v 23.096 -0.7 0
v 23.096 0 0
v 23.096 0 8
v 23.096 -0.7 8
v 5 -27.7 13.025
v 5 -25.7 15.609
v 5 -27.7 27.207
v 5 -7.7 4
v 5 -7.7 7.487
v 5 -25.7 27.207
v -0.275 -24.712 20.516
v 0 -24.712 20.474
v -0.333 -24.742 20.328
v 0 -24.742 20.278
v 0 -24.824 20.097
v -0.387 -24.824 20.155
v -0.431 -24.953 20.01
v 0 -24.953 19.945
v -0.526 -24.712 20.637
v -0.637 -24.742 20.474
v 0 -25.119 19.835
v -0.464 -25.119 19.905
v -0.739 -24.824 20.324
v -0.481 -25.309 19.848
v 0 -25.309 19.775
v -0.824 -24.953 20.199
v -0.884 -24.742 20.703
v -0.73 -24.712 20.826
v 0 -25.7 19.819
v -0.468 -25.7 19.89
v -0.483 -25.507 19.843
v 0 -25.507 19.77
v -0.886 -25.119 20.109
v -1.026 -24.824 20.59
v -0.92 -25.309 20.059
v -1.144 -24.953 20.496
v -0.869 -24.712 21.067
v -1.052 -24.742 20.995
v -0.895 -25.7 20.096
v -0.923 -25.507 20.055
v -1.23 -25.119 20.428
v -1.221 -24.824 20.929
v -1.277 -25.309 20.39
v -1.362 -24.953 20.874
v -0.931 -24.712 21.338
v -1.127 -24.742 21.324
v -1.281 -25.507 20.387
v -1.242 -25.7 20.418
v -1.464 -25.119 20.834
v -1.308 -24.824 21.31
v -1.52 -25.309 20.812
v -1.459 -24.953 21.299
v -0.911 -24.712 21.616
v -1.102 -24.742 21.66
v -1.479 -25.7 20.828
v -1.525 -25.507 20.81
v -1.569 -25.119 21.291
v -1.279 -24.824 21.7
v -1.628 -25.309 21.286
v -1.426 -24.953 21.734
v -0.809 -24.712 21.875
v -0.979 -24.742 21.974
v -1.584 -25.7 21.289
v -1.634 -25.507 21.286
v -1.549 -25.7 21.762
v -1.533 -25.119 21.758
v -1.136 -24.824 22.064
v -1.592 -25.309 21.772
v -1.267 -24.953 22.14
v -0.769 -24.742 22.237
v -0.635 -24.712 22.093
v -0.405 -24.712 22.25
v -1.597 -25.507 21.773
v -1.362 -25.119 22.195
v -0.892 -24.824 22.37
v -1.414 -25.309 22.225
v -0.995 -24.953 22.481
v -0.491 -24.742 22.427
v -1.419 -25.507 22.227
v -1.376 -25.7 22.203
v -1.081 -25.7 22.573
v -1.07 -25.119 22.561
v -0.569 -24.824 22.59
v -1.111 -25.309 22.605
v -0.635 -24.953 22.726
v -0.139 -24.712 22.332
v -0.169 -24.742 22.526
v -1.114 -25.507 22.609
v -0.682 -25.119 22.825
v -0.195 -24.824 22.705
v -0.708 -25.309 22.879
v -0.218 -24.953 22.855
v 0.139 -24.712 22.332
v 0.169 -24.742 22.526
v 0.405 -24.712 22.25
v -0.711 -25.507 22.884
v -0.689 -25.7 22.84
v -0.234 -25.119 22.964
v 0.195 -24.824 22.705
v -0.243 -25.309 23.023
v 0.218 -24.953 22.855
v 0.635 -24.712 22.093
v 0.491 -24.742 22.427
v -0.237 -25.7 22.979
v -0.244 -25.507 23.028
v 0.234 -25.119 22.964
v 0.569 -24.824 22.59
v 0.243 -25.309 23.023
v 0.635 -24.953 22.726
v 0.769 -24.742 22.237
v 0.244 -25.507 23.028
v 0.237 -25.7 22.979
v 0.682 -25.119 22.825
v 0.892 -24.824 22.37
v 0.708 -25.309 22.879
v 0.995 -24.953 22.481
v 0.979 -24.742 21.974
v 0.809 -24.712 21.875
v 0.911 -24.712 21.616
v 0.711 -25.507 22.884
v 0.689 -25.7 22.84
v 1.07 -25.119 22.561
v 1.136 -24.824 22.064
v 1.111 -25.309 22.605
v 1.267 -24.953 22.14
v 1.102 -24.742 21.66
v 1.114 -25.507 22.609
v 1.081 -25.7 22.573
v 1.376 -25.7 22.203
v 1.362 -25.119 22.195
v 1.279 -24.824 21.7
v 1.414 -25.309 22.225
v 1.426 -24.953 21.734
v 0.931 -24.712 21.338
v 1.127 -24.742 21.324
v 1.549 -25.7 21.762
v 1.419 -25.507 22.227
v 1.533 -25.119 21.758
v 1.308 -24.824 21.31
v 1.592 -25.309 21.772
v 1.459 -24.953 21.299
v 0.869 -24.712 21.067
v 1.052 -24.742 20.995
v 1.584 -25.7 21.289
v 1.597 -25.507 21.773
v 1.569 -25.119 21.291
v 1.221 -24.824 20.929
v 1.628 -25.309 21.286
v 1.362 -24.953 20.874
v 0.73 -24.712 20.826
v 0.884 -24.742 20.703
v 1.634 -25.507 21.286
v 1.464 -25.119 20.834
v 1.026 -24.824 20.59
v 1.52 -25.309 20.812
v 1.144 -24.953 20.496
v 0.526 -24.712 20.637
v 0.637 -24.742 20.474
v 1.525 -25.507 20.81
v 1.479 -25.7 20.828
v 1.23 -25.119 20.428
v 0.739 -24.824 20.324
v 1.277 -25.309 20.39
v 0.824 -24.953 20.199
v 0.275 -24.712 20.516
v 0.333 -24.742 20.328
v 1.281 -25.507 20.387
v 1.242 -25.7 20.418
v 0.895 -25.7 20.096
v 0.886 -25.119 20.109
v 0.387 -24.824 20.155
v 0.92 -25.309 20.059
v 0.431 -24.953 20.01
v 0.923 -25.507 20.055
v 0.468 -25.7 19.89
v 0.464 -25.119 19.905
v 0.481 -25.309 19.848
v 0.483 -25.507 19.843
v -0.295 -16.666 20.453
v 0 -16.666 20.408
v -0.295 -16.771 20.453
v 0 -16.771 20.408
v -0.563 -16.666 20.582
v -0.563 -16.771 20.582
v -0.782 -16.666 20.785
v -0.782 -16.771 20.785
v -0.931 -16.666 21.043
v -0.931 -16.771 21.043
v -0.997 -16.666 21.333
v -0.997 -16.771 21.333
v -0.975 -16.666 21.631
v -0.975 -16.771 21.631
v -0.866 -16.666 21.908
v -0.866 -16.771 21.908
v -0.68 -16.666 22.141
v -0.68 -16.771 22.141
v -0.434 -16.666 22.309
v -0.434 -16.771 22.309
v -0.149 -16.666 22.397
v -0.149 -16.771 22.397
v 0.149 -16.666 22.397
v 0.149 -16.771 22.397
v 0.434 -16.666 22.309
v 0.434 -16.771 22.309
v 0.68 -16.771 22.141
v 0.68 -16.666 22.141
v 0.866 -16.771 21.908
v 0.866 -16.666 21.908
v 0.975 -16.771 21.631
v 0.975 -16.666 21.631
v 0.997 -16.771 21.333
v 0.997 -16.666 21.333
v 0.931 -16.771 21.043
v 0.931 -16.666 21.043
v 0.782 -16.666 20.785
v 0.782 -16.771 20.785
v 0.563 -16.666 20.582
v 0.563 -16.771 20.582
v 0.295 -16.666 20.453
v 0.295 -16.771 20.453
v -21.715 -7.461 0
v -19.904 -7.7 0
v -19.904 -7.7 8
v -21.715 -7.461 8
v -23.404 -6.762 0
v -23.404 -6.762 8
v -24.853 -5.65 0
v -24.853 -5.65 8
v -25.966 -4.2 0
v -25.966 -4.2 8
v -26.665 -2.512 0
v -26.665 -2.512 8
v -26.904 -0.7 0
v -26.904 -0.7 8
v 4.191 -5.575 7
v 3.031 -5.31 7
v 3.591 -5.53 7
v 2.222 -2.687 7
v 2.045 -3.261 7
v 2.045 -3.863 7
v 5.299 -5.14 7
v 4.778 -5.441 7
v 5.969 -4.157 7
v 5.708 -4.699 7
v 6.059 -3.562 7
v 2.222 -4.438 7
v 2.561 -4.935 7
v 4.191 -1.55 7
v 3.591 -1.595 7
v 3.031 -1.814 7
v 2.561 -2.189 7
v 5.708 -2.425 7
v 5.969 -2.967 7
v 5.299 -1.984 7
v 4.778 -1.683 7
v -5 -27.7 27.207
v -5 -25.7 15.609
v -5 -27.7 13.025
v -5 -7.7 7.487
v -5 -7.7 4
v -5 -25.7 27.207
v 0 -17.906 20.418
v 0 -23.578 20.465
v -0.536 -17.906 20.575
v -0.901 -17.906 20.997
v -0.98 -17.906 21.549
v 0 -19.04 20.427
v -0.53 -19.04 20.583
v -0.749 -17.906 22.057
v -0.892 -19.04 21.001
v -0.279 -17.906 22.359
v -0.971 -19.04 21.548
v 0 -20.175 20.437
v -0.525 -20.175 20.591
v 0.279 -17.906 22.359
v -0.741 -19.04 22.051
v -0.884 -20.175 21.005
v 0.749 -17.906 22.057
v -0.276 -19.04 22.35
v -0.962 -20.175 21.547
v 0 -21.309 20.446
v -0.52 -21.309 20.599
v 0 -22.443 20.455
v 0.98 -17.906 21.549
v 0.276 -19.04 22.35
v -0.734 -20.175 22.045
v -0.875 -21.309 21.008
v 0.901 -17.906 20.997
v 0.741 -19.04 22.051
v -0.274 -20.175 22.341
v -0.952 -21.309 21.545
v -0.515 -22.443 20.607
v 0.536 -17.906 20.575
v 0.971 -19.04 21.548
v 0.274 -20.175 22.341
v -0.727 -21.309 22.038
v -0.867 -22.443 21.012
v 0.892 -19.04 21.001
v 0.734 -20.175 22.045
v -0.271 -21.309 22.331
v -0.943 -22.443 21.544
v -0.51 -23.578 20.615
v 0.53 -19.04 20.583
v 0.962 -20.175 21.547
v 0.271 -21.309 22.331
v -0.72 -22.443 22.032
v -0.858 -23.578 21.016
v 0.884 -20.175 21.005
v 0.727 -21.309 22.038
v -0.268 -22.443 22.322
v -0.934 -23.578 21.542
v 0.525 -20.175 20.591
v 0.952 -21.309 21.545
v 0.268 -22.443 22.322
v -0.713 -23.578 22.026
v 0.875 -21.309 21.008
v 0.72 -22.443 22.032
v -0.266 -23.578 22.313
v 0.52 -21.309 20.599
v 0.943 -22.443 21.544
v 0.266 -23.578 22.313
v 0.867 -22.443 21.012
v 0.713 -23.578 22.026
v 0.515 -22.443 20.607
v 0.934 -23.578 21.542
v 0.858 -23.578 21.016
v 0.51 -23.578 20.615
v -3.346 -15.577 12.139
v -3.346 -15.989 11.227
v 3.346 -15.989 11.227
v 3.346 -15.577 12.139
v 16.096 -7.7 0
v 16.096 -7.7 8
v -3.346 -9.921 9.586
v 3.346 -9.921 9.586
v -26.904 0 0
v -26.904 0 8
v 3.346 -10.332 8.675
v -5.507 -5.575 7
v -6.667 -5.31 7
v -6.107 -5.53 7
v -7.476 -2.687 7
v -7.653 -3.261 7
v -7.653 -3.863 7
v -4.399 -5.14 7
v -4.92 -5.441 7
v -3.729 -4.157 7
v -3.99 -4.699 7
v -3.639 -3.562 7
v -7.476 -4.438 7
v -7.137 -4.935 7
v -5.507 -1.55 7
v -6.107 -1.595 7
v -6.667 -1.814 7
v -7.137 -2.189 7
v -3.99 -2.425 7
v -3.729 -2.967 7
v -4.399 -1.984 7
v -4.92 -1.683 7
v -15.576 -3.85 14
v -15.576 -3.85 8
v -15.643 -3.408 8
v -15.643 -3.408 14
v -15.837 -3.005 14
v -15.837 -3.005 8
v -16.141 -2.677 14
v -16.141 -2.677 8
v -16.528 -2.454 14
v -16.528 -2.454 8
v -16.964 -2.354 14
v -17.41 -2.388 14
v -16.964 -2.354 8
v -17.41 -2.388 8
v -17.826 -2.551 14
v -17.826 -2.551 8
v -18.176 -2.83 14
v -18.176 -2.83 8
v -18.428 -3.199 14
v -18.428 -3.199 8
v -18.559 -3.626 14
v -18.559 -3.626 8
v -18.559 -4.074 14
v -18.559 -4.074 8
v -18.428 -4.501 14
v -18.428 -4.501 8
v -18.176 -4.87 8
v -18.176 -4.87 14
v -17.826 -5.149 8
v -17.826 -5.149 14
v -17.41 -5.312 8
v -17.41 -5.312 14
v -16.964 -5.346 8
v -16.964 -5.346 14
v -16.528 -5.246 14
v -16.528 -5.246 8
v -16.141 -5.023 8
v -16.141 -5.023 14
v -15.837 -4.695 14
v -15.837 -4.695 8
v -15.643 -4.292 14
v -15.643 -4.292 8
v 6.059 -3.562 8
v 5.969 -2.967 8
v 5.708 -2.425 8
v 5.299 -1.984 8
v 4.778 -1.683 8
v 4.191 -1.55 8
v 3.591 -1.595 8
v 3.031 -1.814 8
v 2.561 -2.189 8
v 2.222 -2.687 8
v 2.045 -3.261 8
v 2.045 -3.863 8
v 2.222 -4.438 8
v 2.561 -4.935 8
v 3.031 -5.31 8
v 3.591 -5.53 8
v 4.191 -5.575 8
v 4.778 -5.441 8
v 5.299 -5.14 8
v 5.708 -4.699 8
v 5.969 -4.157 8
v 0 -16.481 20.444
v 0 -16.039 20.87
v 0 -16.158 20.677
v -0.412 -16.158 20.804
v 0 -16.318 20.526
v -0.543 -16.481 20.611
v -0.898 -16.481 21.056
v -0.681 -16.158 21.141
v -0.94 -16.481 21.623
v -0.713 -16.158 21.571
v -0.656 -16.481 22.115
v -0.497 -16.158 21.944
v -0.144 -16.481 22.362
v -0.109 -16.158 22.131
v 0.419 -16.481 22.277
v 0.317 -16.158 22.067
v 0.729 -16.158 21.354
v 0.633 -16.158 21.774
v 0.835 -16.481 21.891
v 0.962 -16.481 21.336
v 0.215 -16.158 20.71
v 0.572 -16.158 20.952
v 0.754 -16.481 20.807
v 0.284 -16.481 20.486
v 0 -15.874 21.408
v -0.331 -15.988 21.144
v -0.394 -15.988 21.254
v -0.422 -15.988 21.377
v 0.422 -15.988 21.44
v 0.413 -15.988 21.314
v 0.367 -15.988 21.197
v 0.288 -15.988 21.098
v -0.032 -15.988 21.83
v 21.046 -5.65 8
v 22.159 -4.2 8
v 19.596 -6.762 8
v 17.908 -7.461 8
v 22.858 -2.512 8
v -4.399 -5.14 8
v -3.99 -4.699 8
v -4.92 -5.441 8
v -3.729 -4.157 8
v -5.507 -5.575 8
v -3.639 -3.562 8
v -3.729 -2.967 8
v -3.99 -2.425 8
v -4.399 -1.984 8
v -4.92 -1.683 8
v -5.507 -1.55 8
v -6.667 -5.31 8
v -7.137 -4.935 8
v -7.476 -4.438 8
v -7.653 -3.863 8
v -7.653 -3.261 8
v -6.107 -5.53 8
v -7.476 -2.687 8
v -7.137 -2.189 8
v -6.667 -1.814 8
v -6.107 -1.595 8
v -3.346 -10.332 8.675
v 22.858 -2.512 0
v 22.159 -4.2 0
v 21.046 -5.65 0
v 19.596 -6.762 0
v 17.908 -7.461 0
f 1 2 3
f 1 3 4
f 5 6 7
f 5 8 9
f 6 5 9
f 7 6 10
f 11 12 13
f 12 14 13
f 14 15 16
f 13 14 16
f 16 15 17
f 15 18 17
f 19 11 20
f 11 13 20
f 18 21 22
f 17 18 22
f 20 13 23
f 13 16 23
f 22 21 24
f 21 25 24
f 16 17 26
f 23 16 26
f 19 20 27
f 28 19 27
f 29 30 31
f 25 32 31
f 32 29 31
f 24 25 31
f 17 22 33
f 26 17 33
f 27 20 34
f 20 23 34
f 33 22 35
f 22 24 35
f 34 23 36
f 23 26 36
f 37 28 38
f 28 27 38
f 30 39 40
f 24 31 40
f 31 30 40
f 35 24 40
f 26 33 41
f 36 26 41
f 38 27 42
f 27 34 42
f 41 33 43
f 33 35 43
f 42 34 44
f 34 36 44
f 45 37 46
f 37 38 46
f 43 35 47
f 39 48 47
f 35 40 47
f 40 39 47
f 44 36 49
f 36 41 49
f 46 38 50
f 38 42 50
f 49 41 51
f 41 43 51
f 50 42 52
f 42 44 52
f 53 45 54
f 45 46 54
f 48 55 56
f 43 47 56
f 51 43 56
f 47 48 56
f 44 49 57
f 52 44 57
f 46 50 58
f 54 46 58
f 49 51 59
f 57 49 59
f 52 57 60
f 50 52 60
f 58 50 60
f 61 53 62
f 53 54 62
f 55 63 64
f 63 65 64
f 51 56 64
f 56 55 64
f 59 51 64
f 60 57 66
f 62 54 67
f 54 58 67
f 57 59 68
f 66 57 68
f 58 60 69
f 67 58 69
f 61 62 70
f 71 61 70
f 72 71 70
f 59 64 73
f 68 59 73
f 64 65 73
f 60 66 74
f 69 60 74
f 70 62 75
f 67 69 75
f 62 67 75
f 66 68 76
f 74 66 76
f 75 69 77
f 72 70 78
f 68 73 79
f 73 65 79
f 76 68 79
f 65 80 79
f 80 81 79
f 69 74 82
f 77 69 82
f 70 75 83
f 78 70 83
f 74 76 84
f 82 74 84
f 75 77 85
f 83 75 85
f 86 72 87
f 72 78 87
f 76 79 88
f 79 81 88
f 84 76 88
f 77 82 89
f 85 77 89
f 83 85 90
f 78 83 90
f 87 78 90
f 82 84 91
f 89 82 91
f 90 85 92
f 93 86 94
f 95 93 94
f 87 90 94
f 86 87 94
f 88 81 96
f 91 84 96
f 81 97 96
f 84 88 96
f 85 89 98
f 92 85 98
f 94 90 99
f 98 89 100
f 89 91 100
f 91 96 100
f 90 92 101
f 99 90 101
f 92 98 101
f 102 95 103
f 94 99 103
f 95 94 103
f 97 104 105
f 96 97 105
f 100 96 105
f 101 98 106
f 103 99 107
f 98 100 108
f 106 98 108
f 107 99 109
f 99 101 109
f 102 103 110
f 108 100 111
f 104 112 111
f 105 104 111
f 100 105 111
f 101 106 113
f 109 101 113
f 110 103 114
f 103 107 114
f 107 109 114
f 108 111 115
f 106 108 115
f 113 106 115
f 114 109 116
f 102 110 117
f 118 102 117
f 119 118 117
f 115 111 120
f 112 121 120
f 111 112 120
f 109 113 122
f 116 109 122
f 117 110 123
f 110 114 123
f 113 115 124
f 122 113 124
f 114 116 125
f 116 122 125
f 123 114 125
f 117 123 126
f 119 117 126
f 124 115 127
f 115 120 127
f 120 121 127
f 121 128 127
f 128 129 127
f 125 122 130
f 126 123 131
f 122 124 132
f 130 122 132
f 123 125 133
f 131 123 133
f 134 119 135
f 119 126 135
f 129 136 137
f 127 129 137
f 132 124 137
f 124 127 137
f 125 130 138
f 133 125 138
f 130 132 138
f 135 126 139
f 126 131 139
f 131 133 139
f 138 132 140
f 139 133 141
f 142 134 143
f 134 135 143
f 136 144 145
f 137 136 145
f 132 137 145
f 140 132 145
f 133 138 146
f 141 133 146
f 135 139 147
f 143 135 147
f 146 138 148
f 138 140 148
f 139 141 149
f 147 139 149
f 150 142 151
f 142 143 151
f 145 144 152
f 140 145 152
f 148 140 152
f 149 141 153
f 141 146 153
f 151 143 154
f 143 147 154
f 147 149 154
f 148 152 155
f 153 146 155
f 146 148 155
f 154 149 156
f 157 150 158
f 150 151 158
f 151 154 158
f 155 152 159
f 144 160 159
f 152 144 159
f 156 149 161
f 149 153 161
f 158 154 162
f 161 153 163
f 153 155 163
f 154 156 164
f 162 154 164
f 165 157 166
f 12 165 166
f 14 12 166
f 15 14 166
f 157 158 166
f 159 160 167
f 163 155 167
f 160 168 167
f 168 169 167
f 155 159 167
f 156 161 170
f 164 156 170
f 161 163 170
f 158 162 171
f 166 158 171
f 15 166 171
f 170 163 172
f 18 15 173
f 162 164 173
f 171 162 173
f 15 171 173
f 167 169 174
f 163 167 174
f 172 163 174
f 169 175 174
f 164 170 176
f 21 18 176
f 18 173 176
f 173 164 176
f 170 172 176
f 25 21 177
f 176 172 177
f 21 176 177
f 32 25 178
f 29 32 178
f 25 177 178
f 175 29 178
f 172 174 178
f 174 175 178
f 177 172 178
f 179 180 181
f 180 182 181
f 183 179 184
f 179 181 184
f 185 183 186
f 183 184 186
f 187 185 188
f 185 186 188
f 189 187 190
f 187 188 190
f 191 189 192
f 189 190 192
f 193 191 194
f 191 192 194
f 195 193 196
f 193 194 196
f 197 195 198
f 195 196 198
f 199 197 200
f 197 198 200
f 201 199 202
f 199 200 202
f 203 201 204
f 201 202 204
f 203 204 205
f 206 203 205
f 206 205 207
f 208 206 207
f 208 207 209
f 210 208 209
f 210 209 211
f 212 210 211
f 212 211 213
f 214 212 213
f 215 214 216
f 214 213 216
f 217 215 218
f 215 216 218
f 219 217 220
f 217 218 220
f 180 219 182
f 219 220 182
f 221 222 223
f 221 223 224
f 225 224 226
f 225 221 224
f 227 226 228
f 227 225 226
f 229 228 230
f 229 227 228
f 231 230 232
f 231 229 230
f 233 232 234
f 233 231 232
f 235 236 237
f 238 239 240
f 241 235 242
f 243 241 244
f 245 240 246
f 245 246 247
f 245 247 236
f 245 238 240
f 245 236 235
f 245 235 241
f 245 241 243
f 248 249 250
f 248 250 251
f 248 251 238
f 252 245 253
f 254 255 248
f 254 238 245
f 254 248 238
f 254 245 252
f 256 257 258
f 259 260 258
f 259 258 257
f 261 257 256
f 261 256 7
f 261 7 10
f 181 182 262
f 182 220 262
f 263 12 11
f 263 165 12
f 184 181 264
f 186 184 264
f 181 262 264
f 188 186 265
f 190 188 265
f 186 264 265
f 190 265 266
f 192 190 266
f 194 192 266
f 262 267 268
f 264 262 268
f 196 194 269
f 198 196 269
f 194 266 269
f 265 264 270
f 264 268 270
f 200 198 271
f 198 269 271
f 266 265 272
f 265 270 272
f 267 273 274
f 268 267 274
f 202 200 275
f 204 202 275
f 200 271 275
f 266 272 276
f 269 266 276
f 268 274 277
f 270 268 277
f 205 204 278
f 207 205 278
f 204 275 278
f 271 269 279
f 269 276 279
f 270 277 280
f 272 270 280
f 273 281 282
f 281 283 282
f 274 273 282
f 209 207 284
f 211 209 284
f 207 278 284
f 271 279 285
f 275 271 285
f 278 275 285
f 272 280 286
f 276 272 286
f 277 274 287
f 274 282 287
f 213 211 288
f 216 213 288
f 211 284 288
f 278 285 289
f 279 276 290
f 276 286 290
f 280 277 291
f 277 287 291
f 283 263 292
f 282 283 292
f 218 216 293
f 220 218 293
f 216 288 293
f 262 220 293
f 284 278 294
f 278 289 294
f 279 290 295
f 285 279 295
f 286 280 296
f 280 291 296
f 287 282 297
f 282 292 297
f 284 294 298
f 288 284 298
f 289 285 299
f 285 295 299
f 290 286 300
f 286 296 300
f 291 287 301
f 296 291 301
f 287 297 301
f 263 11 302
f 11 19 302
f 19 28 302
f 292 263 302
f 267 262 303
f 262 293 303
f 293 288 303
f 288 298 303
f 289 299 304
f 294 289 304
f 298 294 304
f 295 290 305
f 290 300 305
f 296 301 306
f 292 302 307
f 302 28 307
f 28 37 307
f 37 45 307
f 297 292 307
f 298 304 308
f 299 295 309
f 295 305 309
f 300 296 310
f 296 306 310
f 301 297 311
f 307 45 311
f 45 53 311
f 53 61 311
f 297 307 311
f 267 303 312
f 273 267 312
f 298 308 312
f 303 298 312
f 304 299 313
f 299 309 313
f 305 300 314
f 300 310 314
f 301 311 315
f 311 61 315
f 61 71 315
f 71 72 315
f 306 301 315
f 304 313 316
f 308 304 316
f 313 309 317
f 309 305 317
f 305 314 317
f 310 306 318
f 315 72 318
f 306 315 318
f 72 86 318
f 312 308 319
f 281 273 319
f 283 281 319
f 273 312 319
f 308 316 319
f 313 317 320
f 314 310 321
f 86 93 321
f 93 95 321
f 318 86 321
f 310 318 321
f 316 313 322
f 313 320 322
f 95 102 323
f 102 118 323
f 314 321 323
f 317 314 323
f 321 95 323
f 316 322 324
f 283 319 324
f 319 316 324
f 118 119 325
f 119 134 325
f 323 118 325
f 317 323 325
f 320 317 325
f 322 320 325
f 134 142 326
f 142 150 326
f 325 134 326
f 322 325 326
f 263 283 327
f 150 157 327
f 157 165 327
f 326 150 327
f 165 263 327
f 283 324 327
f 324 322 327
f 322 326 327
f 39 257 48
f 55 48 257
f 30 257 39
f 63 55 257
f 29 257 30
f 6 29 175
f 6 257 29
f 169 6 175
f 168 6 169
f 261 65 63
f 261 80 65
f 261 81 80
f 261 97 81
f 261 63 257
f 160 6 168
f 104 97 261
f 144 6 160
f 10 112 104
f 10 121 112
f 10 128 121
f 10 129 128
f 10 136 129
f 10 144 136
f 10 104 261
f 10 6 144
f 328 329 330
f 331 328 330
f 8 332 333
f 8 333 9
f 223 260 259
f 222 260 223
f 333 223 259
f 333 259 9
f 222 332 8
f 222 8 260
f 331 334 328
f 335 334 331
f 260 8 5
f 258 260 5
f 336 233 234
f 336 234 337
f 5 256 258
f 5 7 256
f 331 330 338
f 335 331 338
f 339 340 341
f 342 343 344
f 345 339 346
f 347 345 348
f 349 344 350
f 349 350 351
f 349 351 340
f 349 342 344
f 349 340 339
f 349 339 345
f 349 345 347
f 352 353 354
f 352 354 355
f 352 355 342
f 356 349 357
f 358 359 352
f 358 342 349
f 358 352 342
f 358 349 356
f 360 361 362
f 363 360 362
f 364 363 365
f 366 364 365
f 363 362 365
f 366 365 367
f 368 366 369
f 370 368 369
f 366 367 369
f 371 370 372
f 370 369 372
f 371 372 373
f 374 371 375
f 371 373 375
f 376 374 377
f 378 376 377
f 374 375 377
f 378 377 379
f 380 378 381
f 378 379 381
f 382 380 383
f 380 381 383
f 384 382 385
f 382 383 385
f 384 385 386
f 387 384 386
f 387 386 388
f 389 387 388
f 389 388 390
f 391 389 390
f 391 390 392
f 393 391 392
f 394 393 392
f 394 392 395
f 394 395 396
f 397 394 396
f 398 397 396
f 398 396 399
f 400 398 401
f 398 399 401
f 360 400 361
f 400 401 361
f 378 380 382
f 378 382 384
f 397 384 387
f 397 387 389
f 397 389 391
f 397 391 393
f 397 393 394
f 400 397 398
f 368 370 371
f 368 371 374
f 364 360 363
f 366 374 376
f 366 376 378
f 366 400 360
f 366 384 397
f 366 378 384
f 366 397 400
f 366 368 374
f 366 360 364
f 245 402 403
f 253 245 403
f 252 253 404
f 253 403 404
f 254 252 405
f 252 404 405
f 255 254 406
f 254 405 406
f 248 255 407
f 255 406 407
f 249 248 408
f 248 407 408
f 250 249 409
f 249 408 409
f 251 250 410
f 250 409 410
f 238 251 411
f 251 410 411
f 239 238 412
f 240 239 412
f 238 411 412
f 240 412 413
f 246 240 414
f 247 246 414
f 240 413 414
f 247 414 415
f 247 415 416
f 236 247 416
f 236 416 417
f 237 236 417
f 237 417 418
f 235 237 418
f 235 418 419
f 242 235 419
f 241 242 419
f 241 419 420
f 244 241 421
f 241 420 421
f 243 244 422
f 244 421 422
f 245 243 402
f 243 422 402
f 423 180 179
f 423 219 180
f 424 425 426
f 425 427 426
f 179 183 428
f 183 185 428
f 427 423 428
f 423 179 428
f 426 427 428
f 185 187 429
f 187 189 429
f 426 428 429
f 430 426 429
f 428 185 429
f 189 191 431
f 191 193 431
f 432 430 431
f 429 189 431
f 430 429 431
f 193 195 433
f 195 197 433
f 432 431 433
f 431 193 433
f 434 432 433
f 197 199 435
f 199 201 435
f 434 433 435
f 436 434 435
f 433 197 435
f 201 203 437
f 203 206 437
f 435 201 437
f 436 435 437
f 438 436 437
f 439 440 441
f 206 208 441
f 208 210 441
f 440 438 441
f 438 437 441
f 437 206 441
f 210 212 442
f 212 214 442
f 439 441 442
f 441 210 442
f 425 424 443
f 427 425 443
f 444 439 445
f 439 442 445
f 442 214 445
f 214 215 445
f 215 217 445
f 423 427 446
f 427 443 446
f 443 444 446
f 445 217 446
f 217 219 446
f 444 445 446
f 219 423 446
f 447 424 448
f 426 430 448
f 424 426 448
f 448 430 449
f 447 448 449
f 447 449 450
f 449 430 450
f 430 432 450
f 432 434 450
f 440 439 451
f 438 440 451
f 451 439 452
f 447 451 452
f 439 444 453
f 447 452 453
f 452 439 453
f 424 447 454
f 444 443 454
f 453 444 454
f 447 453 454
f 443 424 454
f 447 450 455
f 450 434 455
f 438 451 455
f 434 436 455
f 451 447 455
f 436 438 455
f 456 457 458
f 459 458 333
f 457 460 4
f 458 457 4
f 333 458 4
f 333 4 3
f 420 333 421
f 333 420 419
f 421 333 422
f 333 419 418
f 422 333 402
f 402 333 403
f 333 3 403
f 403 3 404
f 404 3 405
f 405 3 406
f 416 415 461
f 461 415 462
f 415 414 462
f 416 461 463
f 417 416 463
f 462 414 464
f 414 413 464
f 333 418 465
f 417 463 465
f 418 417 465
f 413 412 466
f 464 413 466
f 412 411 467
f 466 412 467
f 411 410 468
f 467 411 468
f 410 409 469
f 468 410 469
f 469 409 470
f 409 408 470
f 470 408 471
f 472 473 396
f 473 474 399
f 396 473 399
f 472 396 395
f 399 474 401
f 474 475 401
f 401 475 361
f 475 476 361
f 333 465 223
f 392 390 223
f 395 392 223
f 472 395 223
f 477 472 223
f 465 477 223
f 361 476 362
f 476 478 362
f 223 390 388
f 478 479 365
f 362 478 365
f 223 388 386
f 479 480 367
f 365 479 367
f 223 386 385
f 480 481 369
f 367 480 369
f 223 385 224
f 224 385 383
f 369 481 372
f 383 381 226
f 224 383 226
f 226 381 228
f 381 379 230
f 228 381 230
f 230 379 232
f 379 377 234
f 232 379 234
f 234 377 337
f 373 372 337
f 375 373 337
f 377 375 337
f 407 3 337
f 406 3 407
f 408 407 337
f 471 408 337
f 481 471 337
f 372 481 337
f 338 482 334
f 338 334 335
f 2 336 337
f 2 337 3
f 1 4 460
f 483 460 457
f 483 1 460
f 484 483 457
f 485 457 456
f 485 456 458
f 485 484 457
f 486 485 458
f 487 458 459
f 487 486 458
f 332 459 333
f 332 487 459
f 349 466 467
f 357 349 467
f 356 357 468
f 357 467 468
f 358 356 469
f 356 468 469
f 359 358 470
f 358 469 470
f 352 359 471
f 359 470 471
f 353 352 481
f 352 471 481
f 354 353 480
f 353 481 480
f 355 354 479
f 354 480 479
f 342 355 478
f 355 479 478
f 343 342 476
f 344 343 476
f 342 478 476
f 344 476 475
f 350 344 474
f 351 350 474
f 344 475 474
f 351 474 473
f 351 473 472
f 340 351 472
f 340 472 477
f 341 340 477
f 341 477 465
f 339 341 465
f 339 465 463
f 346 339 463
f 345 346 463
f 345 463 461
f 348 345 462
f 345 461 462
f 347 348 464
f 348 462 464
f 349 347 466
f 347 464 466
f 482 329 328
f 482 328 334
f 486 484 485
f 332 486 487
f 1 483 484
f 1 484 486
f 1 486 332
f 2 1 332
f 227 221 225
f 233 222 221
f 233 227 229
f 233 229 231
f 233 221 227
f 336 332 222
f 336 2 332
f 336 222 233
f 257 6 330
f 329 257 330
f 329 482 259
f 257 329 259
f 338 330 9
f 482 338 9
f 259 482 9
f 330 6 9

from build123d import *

# Parameters (mm, degrees)
BOSS_EXTRUDE1_DEPTH = 8
SKETCH2_R           = 1.5
BOSS_EXTRUDE2_DEPTH = 6
BOSS_EXTRUDE3_DEPTH = 5
SKETCH6_W           = 6.69152868
SKETCH6_H           = 6.205945627
BOSS_EXTRUDE6_DEPTH = 1
SKETCH7_R           = 2.018356376
CUT_EXTRUDE1_DEPTH  = 1


with BuildPart() as part:
    # Sketch1 → Boss-Extrude1 (new body)
    with BuildSketch(Plane.XY):
        with BuildLine():
            Line((-26.903550099, 0), (23.096449901, 0))
            Line((23.096449901, 0), (23.096449901, -0.7))
            ThreePointArc((23.096449901, -0.7), (21.046197369, -5.649747468), (16.096449901, -7.7))
            Line((16.096449901, -7.7), (-19.903550099, -7.7))
            ThreePointArc((-19.903550099, -7.7), (-24.853297568, -5.649747468), (-26.903550099, -0.7))
            Line((-26.903550099, -0.7), (-26.903550099, 0))
        make_face()
    extrude(amount=BOSS_EXTRUDE1_DEPTH)

    # Sketch2 → Boss-Extrude2 (add)
    with BuildSketch(Plane.XY.offset(8)):
        with Locations((-17.076235964, -3.85)):
            Circle(SKETCH2_R)
    extrude(amount=BOSS_EXTRUDE2_DEPTH)

    # Sketch3 → Boss-Extrude3 (add, symmetric)
    with BuildSketch(Plane(origin=(0, 0, 0), x_dir=(0, 0, -1), z_dir=(1, 0, 0))):
        Polygon((-4, -7.7), (-13.024577684, -27.7), (-25.024577684, -27.7), (-27.207163102, -27.7), (-27.207163102, -25.7), (-25.024577684, -25.7), (-15.609285193, -25.7), (-7.487165278, -7.7), align=None)
    extrude(amount=BOSS_EXTRUDE3_DEPTH, both=True)

    # Sketch6 → Boss-Extrude6 (add)
    with BuildSketch(Plane(origin=(0, 1.504350405, 3.333896515), x_dir=(1, 0, 0), z_dir=(0, 0.411295964451016, 0.911501853879798))):
        with Locations((0, -16.088463414)):
            Rectangle(SKETCH6_W, SKETCH6_H)
    extrude(amount=BOSS_EXTRUDE6_DEPTH)

    # Sketch7 → Cut-Extrude1 (cut)
    with BuildSketch(Plane.XY.offset(8)):
        with Locations((-5.657616705, -3.562287369)):
            Circle(SKETCH7_R)
        with Locations((4.040388693, -3.562287369)):
            Circle(SKETCH7_R)
    extrude(amount=-CUT_EXTRUDE1_DEPTH, mode=Mode.SUBTRACT)

    # Sketch10 → Revolve2 (revolve)
    with BuildSketch(Plane(origin=(0, 0, 0), x_dir=(0, 0, -1), z_dir=(1, 0, 0)), mode=Mode.PRIVATE) as revolve2_sk:
        with BuildLine():
            Line((-22.996998778, -25.7), (-21.408224147, -25.7))
            Line((-21.408224147, -25.7), (-21.408224147, -15.873742871))
            add(Edge.make_bspline(
                [(-21.408224147, -15.873742871), (-22.370300932, -16.046682358), (-22.408224147, -16.666364236)],
                knots=[0, 0, 0, 0.92415357, 0.92415357, 0.92415357], degree=2))
            Line((-22.408224147, -16.666364236), (-22.408224147, -16.771089476))
            Line((-22.408224147, -16.771089476), (-22.342150898, -24.712427098))
            ThreePointArc((-22.342150898, -24.712427098), (-22.931989874, -25.03220925), (-22.996998778, -25.7))
        make_face()
    revolve(revolve2_sk.sketch.rotate(Axis((0, -25.7, 21.408224147), (0, 1, 0)), 180), axis=Axis((0, -25.7, 21.408224147), (0, 1, 0)))


solid = part.part
